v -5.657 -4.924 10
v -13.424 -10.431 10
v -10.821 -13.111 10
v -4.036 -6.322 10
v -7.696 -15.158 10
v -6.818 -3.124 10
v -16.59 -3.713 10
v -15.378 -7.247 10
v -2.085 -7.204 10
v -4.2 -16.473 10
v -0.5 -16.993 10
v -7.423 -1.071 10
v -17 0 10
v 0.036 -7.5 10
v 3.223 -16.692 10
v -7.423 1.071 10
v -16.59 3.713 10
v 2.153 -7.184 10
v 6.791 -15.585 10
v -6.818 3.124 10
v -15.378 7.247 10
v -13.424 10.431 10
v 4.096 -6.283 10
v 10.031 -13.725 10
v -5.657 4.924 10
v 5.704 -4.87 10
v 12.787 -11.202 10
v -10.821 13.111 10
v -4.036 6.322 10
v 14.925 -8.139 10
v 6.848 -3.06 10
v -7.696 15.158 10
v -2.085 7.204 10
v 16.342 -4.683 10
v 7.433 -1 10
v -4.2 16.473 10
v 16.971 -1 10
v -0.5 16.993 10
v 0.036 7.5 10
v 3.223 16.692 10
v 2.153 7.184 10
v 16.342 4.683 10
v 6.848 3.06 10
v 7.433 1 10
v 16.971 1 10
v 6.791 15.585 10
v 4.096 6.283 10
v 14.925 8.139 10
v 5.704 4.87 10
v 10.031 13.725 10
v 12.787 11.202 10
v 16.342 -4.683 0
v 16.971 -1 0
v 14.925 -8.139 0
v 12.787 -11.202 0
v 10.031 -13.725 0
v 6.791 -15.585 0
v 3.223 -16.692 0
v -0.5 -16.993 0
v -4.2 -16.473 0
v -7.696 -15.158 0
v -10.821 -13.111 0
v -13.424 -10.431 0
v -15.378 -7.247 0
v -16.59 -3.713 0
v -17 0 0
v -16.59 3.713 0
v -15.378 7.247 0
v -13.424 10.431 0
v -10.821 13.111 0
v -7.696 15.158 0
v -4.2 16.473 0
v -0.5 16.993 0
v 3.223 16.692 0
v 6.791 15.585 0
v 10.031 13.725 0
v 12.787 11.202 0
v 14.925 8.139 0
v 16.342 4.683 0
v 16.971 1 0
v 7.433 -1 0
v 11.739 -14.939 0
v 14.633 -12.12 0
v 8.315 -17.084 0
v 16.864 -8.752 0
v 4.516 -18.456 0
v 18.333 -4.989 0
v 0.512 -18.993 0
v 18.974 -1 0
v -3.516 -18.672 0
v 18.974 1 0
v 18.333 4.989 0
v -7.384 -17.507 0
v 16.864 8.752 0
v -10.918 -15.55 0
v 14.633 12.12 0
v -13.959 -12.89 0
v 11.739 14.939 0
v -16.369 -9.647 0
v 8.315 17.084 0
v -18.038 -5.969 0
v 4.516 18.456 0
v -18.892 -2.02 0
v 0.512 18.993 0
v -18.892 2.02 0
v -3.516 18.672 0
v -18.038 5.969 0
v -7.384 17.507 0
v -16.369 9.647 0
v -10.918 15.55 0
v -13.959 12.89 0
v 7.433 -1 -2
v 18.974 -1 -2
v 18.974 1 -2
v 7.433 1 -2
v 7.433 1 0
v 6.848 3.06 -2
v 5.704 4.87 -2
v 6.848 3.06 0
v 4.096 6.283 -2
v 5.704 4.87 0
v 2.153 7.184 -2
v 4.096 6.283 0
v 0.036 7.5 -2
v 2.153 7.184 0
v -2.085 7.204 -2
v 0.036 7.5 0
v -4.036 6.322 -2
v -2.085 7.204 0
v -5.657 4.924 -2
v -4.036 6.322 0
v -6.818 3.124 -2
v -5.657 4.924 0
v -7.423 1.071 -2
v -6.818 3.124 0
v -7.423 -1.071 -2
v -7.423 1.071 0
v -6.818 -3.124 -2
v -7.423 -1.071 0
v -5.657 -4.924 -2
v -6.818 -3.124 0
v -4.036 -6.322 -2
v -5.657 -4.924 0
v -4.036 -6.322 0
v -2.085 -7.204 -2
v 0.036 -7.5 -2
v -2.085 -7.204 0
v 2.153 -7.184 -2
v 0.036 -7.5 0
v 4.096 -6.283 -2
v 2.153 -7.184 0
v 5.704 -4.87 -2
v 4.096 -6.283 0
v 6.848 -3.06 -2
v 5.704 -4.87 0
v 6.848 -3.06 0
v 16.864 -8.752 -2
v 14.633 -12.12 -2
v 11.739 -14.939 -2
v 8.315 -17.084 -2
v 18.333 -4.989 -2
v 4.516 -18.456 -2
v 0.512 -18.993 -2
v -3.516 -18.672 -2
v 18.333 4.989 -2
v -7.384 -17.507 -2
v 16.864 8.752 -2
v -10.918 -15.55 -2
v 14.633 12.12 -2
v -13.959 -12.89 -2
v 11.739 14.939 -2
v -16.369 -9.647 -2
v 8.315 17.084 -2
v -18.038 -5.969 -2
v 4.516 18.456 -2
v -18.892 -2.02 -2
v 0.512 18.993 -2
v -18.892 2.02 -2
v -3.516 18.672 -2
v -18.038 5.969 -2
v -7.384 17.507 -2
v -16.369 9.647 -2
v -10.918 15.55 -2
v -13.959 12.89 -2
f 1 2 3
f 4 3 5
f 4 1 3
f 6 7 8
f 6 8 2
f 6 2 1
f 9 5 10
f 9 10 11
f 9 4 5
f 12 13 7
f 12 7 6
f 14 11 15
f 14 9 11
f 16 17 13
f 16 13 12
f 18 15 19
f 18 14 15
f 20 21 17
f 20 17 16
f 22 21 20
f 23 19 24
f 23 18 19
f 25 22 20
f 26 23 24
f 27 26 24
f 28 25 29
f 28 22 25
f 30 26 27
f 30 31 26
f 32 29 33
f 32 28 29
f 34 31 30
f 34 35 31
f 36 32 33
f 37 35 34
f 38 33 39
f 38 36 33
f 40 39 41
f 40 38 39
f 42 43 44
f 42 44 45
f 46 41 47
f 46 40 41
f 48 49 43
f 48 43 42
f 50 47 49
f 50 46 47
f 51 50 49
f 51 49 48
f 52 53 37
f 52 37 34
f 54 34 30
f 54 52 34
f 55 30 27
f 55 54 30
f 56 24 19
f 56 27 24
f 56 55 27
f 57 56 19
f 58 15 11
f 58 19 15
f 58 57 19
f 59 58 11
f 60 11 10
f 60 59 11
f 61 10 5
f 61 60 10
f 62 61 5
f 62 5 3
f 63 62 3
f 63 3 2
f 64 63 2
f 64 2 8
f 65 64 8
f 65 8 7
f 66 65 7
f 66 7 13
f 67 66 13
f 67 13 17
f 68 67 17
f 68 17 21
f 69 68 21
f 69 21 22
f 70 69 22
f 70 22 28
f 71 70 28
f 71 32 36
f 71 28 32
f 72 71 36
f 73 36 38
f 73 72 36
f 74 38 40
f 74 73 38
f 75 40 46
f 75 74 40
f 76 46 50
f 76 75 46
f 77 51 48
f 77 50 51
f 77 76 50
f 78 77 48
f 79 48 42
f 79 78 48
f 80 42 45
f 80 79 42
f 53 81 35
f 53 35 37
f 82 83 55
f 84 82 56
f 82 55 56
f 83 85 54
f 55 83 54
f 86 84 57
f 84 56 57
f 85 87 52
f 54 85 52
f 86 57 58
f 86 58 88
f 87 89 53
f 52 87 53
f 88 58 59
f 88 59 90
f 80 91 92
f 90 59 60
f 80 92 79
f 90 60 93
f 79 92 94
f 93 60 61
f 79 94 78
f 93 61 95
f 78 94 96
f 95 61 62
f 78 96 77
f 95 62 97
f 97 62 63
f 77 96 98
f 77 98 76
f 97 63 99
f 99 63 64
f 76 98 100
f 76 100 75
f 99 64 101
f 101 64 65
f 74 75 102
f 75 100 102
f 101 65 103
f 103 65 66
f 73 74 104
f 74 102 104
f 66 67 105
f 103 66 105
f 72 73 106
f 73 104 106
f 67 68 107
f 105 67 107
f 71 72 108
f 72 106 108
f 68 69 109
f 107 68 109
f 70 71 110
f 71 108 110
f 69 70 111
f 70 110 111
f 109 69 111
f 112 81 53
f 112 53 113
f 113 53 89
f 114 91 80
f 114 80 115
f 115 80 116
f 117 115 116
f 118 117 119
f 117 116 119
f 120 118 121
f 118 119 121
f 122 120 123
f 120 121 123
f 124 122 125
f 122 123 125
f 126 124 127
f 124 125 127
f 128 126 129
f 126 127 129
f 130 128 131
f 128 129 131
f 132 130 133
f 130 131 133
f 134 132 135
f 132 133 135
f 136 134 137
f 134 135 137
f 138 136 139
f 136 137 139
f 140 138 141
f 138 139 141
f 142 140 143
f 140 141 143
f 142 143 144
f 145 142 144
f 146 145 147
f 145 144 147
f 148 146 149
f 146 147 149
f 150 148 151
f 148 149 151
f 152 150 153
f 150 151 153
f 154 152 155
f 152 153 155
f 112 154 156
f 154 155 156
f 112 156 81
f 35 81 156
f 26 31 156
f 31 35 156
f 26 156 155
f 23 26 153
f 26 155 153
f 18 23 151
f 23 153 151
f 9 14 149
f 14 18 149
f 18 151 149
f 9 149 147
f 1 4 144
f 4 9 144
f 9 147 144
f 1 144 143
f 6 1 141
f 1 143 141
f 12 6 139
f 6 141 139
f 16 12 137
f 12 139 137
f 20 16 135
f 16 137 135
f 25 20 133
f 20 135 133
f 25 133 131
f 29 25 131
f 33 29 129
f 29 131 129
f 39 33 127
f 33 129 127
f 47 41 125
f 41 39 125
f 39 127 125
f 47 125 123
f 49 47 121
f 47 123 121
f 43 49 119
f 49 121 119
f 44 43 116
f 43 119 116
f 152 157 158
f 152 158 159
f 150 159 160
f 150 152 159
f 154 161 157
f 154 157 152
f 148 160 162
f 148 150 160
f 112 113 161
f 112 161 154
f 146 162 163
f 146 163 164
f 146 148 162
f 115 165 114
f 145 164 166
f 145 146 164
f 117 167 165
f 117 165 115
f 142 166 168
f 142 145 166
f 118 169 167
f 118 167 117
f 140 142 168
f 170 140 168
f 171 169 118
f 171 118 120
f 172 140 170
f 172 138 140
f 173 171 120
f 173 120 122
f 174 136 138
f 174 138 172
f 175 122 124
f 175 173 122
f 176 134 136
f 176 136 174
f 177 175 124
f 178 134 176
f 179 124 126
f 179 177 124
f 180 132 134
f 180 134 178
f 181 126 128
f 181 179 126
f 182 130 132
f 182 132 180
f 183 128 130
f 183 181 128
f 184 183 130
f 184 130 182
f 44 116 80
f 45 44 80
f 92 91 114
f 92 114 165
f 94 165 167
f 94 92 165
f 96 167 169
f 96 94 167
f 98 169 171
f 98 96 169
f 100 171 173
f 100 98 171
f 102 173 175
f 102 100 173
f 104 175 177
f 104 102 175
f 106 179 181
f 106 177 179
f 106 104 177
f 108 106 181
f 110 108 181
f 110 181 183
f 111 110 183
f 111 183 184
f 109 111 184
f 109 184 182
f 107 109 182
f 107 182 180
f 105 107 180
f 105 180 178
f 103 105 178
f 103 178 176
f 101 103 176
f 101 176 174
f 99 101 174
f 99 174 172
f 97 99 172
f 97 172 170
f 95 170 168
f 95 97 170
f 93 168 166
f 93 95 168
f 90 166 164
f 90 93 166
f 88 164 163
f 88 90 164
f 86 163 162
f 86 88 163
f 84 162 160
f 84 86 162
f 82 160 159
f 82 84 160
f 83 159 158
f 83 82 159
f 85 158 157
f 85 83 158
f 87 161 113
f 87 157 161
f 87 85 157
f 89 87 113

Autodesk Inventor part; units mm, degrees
ref_plane "YZ Plane" through (0, 0, 0) normal (1, 0, 0) x (0, 1, 0)
ref_plane "XZ Plane" through (0, 0, 0) normal (0, 1, 0) x (-1, 0, 0)
ref_plane "XY Plane" through (0, 0, 0) normal (0, 0, 1) x (1, 0, 0)
sketch "Skizze1" plane through (0, 0, 0) normal (0, 0, 1) x (1, 0, 0)
  arc A0 (7.433, 1) -> (7.433, -1) centre (0, 0) ccw
  arc A1 (16.9706, 1) -> (16.9706, -1) centre (0, 0) ccw
  line L0 (0, 0) -> (15.5172, 0) construction
  line L1 (7.433, -1) -> (16.9706, -1)
  line L2 (7.433, 1) -> (16.9706, 1)
  circle A2 centre (0, 0) radius 7.5 construction
  circle A3 centre (0, 0) radius 17 construction
  dimension "d0" = 15
  dimension "d1" = 34
  dimension "d2" = 2
extrude "Extrusion1" add sketch "Skizze1" along normal blind 10
sketch "Skizze2" plane through (0, 0, 0) normal (0, 0, -1) x (-1, 0, 0)
  arc A0 (-7.433, -1) -> (-7.433, 1) centre (0, 0) ccw projected
  line L0 (-7.433, -1) -> (-16.9706, -1) projected
  arc A1 (-16.9706, -1) -> (-16.9706, 1) centre (0, 0) ccw projected
  line L1 (-16.9706, 1) -> (-7.433, 1) projected
  arc A2 (-18.9737, -1) -> (-18.9737, 1) centre (0, 0) ccw
  line L2 (-16.9706, -1) -> (-18.9737, -1)
  line L3 (-16.9706, 1) -> (-18.9737, 1)
  dimension "d5" = 2
extrude "Extrusion2" add sketch "Skizze2" along normal blind 2
properties part number "edingClamp" material "ABS-Kunststoff"
